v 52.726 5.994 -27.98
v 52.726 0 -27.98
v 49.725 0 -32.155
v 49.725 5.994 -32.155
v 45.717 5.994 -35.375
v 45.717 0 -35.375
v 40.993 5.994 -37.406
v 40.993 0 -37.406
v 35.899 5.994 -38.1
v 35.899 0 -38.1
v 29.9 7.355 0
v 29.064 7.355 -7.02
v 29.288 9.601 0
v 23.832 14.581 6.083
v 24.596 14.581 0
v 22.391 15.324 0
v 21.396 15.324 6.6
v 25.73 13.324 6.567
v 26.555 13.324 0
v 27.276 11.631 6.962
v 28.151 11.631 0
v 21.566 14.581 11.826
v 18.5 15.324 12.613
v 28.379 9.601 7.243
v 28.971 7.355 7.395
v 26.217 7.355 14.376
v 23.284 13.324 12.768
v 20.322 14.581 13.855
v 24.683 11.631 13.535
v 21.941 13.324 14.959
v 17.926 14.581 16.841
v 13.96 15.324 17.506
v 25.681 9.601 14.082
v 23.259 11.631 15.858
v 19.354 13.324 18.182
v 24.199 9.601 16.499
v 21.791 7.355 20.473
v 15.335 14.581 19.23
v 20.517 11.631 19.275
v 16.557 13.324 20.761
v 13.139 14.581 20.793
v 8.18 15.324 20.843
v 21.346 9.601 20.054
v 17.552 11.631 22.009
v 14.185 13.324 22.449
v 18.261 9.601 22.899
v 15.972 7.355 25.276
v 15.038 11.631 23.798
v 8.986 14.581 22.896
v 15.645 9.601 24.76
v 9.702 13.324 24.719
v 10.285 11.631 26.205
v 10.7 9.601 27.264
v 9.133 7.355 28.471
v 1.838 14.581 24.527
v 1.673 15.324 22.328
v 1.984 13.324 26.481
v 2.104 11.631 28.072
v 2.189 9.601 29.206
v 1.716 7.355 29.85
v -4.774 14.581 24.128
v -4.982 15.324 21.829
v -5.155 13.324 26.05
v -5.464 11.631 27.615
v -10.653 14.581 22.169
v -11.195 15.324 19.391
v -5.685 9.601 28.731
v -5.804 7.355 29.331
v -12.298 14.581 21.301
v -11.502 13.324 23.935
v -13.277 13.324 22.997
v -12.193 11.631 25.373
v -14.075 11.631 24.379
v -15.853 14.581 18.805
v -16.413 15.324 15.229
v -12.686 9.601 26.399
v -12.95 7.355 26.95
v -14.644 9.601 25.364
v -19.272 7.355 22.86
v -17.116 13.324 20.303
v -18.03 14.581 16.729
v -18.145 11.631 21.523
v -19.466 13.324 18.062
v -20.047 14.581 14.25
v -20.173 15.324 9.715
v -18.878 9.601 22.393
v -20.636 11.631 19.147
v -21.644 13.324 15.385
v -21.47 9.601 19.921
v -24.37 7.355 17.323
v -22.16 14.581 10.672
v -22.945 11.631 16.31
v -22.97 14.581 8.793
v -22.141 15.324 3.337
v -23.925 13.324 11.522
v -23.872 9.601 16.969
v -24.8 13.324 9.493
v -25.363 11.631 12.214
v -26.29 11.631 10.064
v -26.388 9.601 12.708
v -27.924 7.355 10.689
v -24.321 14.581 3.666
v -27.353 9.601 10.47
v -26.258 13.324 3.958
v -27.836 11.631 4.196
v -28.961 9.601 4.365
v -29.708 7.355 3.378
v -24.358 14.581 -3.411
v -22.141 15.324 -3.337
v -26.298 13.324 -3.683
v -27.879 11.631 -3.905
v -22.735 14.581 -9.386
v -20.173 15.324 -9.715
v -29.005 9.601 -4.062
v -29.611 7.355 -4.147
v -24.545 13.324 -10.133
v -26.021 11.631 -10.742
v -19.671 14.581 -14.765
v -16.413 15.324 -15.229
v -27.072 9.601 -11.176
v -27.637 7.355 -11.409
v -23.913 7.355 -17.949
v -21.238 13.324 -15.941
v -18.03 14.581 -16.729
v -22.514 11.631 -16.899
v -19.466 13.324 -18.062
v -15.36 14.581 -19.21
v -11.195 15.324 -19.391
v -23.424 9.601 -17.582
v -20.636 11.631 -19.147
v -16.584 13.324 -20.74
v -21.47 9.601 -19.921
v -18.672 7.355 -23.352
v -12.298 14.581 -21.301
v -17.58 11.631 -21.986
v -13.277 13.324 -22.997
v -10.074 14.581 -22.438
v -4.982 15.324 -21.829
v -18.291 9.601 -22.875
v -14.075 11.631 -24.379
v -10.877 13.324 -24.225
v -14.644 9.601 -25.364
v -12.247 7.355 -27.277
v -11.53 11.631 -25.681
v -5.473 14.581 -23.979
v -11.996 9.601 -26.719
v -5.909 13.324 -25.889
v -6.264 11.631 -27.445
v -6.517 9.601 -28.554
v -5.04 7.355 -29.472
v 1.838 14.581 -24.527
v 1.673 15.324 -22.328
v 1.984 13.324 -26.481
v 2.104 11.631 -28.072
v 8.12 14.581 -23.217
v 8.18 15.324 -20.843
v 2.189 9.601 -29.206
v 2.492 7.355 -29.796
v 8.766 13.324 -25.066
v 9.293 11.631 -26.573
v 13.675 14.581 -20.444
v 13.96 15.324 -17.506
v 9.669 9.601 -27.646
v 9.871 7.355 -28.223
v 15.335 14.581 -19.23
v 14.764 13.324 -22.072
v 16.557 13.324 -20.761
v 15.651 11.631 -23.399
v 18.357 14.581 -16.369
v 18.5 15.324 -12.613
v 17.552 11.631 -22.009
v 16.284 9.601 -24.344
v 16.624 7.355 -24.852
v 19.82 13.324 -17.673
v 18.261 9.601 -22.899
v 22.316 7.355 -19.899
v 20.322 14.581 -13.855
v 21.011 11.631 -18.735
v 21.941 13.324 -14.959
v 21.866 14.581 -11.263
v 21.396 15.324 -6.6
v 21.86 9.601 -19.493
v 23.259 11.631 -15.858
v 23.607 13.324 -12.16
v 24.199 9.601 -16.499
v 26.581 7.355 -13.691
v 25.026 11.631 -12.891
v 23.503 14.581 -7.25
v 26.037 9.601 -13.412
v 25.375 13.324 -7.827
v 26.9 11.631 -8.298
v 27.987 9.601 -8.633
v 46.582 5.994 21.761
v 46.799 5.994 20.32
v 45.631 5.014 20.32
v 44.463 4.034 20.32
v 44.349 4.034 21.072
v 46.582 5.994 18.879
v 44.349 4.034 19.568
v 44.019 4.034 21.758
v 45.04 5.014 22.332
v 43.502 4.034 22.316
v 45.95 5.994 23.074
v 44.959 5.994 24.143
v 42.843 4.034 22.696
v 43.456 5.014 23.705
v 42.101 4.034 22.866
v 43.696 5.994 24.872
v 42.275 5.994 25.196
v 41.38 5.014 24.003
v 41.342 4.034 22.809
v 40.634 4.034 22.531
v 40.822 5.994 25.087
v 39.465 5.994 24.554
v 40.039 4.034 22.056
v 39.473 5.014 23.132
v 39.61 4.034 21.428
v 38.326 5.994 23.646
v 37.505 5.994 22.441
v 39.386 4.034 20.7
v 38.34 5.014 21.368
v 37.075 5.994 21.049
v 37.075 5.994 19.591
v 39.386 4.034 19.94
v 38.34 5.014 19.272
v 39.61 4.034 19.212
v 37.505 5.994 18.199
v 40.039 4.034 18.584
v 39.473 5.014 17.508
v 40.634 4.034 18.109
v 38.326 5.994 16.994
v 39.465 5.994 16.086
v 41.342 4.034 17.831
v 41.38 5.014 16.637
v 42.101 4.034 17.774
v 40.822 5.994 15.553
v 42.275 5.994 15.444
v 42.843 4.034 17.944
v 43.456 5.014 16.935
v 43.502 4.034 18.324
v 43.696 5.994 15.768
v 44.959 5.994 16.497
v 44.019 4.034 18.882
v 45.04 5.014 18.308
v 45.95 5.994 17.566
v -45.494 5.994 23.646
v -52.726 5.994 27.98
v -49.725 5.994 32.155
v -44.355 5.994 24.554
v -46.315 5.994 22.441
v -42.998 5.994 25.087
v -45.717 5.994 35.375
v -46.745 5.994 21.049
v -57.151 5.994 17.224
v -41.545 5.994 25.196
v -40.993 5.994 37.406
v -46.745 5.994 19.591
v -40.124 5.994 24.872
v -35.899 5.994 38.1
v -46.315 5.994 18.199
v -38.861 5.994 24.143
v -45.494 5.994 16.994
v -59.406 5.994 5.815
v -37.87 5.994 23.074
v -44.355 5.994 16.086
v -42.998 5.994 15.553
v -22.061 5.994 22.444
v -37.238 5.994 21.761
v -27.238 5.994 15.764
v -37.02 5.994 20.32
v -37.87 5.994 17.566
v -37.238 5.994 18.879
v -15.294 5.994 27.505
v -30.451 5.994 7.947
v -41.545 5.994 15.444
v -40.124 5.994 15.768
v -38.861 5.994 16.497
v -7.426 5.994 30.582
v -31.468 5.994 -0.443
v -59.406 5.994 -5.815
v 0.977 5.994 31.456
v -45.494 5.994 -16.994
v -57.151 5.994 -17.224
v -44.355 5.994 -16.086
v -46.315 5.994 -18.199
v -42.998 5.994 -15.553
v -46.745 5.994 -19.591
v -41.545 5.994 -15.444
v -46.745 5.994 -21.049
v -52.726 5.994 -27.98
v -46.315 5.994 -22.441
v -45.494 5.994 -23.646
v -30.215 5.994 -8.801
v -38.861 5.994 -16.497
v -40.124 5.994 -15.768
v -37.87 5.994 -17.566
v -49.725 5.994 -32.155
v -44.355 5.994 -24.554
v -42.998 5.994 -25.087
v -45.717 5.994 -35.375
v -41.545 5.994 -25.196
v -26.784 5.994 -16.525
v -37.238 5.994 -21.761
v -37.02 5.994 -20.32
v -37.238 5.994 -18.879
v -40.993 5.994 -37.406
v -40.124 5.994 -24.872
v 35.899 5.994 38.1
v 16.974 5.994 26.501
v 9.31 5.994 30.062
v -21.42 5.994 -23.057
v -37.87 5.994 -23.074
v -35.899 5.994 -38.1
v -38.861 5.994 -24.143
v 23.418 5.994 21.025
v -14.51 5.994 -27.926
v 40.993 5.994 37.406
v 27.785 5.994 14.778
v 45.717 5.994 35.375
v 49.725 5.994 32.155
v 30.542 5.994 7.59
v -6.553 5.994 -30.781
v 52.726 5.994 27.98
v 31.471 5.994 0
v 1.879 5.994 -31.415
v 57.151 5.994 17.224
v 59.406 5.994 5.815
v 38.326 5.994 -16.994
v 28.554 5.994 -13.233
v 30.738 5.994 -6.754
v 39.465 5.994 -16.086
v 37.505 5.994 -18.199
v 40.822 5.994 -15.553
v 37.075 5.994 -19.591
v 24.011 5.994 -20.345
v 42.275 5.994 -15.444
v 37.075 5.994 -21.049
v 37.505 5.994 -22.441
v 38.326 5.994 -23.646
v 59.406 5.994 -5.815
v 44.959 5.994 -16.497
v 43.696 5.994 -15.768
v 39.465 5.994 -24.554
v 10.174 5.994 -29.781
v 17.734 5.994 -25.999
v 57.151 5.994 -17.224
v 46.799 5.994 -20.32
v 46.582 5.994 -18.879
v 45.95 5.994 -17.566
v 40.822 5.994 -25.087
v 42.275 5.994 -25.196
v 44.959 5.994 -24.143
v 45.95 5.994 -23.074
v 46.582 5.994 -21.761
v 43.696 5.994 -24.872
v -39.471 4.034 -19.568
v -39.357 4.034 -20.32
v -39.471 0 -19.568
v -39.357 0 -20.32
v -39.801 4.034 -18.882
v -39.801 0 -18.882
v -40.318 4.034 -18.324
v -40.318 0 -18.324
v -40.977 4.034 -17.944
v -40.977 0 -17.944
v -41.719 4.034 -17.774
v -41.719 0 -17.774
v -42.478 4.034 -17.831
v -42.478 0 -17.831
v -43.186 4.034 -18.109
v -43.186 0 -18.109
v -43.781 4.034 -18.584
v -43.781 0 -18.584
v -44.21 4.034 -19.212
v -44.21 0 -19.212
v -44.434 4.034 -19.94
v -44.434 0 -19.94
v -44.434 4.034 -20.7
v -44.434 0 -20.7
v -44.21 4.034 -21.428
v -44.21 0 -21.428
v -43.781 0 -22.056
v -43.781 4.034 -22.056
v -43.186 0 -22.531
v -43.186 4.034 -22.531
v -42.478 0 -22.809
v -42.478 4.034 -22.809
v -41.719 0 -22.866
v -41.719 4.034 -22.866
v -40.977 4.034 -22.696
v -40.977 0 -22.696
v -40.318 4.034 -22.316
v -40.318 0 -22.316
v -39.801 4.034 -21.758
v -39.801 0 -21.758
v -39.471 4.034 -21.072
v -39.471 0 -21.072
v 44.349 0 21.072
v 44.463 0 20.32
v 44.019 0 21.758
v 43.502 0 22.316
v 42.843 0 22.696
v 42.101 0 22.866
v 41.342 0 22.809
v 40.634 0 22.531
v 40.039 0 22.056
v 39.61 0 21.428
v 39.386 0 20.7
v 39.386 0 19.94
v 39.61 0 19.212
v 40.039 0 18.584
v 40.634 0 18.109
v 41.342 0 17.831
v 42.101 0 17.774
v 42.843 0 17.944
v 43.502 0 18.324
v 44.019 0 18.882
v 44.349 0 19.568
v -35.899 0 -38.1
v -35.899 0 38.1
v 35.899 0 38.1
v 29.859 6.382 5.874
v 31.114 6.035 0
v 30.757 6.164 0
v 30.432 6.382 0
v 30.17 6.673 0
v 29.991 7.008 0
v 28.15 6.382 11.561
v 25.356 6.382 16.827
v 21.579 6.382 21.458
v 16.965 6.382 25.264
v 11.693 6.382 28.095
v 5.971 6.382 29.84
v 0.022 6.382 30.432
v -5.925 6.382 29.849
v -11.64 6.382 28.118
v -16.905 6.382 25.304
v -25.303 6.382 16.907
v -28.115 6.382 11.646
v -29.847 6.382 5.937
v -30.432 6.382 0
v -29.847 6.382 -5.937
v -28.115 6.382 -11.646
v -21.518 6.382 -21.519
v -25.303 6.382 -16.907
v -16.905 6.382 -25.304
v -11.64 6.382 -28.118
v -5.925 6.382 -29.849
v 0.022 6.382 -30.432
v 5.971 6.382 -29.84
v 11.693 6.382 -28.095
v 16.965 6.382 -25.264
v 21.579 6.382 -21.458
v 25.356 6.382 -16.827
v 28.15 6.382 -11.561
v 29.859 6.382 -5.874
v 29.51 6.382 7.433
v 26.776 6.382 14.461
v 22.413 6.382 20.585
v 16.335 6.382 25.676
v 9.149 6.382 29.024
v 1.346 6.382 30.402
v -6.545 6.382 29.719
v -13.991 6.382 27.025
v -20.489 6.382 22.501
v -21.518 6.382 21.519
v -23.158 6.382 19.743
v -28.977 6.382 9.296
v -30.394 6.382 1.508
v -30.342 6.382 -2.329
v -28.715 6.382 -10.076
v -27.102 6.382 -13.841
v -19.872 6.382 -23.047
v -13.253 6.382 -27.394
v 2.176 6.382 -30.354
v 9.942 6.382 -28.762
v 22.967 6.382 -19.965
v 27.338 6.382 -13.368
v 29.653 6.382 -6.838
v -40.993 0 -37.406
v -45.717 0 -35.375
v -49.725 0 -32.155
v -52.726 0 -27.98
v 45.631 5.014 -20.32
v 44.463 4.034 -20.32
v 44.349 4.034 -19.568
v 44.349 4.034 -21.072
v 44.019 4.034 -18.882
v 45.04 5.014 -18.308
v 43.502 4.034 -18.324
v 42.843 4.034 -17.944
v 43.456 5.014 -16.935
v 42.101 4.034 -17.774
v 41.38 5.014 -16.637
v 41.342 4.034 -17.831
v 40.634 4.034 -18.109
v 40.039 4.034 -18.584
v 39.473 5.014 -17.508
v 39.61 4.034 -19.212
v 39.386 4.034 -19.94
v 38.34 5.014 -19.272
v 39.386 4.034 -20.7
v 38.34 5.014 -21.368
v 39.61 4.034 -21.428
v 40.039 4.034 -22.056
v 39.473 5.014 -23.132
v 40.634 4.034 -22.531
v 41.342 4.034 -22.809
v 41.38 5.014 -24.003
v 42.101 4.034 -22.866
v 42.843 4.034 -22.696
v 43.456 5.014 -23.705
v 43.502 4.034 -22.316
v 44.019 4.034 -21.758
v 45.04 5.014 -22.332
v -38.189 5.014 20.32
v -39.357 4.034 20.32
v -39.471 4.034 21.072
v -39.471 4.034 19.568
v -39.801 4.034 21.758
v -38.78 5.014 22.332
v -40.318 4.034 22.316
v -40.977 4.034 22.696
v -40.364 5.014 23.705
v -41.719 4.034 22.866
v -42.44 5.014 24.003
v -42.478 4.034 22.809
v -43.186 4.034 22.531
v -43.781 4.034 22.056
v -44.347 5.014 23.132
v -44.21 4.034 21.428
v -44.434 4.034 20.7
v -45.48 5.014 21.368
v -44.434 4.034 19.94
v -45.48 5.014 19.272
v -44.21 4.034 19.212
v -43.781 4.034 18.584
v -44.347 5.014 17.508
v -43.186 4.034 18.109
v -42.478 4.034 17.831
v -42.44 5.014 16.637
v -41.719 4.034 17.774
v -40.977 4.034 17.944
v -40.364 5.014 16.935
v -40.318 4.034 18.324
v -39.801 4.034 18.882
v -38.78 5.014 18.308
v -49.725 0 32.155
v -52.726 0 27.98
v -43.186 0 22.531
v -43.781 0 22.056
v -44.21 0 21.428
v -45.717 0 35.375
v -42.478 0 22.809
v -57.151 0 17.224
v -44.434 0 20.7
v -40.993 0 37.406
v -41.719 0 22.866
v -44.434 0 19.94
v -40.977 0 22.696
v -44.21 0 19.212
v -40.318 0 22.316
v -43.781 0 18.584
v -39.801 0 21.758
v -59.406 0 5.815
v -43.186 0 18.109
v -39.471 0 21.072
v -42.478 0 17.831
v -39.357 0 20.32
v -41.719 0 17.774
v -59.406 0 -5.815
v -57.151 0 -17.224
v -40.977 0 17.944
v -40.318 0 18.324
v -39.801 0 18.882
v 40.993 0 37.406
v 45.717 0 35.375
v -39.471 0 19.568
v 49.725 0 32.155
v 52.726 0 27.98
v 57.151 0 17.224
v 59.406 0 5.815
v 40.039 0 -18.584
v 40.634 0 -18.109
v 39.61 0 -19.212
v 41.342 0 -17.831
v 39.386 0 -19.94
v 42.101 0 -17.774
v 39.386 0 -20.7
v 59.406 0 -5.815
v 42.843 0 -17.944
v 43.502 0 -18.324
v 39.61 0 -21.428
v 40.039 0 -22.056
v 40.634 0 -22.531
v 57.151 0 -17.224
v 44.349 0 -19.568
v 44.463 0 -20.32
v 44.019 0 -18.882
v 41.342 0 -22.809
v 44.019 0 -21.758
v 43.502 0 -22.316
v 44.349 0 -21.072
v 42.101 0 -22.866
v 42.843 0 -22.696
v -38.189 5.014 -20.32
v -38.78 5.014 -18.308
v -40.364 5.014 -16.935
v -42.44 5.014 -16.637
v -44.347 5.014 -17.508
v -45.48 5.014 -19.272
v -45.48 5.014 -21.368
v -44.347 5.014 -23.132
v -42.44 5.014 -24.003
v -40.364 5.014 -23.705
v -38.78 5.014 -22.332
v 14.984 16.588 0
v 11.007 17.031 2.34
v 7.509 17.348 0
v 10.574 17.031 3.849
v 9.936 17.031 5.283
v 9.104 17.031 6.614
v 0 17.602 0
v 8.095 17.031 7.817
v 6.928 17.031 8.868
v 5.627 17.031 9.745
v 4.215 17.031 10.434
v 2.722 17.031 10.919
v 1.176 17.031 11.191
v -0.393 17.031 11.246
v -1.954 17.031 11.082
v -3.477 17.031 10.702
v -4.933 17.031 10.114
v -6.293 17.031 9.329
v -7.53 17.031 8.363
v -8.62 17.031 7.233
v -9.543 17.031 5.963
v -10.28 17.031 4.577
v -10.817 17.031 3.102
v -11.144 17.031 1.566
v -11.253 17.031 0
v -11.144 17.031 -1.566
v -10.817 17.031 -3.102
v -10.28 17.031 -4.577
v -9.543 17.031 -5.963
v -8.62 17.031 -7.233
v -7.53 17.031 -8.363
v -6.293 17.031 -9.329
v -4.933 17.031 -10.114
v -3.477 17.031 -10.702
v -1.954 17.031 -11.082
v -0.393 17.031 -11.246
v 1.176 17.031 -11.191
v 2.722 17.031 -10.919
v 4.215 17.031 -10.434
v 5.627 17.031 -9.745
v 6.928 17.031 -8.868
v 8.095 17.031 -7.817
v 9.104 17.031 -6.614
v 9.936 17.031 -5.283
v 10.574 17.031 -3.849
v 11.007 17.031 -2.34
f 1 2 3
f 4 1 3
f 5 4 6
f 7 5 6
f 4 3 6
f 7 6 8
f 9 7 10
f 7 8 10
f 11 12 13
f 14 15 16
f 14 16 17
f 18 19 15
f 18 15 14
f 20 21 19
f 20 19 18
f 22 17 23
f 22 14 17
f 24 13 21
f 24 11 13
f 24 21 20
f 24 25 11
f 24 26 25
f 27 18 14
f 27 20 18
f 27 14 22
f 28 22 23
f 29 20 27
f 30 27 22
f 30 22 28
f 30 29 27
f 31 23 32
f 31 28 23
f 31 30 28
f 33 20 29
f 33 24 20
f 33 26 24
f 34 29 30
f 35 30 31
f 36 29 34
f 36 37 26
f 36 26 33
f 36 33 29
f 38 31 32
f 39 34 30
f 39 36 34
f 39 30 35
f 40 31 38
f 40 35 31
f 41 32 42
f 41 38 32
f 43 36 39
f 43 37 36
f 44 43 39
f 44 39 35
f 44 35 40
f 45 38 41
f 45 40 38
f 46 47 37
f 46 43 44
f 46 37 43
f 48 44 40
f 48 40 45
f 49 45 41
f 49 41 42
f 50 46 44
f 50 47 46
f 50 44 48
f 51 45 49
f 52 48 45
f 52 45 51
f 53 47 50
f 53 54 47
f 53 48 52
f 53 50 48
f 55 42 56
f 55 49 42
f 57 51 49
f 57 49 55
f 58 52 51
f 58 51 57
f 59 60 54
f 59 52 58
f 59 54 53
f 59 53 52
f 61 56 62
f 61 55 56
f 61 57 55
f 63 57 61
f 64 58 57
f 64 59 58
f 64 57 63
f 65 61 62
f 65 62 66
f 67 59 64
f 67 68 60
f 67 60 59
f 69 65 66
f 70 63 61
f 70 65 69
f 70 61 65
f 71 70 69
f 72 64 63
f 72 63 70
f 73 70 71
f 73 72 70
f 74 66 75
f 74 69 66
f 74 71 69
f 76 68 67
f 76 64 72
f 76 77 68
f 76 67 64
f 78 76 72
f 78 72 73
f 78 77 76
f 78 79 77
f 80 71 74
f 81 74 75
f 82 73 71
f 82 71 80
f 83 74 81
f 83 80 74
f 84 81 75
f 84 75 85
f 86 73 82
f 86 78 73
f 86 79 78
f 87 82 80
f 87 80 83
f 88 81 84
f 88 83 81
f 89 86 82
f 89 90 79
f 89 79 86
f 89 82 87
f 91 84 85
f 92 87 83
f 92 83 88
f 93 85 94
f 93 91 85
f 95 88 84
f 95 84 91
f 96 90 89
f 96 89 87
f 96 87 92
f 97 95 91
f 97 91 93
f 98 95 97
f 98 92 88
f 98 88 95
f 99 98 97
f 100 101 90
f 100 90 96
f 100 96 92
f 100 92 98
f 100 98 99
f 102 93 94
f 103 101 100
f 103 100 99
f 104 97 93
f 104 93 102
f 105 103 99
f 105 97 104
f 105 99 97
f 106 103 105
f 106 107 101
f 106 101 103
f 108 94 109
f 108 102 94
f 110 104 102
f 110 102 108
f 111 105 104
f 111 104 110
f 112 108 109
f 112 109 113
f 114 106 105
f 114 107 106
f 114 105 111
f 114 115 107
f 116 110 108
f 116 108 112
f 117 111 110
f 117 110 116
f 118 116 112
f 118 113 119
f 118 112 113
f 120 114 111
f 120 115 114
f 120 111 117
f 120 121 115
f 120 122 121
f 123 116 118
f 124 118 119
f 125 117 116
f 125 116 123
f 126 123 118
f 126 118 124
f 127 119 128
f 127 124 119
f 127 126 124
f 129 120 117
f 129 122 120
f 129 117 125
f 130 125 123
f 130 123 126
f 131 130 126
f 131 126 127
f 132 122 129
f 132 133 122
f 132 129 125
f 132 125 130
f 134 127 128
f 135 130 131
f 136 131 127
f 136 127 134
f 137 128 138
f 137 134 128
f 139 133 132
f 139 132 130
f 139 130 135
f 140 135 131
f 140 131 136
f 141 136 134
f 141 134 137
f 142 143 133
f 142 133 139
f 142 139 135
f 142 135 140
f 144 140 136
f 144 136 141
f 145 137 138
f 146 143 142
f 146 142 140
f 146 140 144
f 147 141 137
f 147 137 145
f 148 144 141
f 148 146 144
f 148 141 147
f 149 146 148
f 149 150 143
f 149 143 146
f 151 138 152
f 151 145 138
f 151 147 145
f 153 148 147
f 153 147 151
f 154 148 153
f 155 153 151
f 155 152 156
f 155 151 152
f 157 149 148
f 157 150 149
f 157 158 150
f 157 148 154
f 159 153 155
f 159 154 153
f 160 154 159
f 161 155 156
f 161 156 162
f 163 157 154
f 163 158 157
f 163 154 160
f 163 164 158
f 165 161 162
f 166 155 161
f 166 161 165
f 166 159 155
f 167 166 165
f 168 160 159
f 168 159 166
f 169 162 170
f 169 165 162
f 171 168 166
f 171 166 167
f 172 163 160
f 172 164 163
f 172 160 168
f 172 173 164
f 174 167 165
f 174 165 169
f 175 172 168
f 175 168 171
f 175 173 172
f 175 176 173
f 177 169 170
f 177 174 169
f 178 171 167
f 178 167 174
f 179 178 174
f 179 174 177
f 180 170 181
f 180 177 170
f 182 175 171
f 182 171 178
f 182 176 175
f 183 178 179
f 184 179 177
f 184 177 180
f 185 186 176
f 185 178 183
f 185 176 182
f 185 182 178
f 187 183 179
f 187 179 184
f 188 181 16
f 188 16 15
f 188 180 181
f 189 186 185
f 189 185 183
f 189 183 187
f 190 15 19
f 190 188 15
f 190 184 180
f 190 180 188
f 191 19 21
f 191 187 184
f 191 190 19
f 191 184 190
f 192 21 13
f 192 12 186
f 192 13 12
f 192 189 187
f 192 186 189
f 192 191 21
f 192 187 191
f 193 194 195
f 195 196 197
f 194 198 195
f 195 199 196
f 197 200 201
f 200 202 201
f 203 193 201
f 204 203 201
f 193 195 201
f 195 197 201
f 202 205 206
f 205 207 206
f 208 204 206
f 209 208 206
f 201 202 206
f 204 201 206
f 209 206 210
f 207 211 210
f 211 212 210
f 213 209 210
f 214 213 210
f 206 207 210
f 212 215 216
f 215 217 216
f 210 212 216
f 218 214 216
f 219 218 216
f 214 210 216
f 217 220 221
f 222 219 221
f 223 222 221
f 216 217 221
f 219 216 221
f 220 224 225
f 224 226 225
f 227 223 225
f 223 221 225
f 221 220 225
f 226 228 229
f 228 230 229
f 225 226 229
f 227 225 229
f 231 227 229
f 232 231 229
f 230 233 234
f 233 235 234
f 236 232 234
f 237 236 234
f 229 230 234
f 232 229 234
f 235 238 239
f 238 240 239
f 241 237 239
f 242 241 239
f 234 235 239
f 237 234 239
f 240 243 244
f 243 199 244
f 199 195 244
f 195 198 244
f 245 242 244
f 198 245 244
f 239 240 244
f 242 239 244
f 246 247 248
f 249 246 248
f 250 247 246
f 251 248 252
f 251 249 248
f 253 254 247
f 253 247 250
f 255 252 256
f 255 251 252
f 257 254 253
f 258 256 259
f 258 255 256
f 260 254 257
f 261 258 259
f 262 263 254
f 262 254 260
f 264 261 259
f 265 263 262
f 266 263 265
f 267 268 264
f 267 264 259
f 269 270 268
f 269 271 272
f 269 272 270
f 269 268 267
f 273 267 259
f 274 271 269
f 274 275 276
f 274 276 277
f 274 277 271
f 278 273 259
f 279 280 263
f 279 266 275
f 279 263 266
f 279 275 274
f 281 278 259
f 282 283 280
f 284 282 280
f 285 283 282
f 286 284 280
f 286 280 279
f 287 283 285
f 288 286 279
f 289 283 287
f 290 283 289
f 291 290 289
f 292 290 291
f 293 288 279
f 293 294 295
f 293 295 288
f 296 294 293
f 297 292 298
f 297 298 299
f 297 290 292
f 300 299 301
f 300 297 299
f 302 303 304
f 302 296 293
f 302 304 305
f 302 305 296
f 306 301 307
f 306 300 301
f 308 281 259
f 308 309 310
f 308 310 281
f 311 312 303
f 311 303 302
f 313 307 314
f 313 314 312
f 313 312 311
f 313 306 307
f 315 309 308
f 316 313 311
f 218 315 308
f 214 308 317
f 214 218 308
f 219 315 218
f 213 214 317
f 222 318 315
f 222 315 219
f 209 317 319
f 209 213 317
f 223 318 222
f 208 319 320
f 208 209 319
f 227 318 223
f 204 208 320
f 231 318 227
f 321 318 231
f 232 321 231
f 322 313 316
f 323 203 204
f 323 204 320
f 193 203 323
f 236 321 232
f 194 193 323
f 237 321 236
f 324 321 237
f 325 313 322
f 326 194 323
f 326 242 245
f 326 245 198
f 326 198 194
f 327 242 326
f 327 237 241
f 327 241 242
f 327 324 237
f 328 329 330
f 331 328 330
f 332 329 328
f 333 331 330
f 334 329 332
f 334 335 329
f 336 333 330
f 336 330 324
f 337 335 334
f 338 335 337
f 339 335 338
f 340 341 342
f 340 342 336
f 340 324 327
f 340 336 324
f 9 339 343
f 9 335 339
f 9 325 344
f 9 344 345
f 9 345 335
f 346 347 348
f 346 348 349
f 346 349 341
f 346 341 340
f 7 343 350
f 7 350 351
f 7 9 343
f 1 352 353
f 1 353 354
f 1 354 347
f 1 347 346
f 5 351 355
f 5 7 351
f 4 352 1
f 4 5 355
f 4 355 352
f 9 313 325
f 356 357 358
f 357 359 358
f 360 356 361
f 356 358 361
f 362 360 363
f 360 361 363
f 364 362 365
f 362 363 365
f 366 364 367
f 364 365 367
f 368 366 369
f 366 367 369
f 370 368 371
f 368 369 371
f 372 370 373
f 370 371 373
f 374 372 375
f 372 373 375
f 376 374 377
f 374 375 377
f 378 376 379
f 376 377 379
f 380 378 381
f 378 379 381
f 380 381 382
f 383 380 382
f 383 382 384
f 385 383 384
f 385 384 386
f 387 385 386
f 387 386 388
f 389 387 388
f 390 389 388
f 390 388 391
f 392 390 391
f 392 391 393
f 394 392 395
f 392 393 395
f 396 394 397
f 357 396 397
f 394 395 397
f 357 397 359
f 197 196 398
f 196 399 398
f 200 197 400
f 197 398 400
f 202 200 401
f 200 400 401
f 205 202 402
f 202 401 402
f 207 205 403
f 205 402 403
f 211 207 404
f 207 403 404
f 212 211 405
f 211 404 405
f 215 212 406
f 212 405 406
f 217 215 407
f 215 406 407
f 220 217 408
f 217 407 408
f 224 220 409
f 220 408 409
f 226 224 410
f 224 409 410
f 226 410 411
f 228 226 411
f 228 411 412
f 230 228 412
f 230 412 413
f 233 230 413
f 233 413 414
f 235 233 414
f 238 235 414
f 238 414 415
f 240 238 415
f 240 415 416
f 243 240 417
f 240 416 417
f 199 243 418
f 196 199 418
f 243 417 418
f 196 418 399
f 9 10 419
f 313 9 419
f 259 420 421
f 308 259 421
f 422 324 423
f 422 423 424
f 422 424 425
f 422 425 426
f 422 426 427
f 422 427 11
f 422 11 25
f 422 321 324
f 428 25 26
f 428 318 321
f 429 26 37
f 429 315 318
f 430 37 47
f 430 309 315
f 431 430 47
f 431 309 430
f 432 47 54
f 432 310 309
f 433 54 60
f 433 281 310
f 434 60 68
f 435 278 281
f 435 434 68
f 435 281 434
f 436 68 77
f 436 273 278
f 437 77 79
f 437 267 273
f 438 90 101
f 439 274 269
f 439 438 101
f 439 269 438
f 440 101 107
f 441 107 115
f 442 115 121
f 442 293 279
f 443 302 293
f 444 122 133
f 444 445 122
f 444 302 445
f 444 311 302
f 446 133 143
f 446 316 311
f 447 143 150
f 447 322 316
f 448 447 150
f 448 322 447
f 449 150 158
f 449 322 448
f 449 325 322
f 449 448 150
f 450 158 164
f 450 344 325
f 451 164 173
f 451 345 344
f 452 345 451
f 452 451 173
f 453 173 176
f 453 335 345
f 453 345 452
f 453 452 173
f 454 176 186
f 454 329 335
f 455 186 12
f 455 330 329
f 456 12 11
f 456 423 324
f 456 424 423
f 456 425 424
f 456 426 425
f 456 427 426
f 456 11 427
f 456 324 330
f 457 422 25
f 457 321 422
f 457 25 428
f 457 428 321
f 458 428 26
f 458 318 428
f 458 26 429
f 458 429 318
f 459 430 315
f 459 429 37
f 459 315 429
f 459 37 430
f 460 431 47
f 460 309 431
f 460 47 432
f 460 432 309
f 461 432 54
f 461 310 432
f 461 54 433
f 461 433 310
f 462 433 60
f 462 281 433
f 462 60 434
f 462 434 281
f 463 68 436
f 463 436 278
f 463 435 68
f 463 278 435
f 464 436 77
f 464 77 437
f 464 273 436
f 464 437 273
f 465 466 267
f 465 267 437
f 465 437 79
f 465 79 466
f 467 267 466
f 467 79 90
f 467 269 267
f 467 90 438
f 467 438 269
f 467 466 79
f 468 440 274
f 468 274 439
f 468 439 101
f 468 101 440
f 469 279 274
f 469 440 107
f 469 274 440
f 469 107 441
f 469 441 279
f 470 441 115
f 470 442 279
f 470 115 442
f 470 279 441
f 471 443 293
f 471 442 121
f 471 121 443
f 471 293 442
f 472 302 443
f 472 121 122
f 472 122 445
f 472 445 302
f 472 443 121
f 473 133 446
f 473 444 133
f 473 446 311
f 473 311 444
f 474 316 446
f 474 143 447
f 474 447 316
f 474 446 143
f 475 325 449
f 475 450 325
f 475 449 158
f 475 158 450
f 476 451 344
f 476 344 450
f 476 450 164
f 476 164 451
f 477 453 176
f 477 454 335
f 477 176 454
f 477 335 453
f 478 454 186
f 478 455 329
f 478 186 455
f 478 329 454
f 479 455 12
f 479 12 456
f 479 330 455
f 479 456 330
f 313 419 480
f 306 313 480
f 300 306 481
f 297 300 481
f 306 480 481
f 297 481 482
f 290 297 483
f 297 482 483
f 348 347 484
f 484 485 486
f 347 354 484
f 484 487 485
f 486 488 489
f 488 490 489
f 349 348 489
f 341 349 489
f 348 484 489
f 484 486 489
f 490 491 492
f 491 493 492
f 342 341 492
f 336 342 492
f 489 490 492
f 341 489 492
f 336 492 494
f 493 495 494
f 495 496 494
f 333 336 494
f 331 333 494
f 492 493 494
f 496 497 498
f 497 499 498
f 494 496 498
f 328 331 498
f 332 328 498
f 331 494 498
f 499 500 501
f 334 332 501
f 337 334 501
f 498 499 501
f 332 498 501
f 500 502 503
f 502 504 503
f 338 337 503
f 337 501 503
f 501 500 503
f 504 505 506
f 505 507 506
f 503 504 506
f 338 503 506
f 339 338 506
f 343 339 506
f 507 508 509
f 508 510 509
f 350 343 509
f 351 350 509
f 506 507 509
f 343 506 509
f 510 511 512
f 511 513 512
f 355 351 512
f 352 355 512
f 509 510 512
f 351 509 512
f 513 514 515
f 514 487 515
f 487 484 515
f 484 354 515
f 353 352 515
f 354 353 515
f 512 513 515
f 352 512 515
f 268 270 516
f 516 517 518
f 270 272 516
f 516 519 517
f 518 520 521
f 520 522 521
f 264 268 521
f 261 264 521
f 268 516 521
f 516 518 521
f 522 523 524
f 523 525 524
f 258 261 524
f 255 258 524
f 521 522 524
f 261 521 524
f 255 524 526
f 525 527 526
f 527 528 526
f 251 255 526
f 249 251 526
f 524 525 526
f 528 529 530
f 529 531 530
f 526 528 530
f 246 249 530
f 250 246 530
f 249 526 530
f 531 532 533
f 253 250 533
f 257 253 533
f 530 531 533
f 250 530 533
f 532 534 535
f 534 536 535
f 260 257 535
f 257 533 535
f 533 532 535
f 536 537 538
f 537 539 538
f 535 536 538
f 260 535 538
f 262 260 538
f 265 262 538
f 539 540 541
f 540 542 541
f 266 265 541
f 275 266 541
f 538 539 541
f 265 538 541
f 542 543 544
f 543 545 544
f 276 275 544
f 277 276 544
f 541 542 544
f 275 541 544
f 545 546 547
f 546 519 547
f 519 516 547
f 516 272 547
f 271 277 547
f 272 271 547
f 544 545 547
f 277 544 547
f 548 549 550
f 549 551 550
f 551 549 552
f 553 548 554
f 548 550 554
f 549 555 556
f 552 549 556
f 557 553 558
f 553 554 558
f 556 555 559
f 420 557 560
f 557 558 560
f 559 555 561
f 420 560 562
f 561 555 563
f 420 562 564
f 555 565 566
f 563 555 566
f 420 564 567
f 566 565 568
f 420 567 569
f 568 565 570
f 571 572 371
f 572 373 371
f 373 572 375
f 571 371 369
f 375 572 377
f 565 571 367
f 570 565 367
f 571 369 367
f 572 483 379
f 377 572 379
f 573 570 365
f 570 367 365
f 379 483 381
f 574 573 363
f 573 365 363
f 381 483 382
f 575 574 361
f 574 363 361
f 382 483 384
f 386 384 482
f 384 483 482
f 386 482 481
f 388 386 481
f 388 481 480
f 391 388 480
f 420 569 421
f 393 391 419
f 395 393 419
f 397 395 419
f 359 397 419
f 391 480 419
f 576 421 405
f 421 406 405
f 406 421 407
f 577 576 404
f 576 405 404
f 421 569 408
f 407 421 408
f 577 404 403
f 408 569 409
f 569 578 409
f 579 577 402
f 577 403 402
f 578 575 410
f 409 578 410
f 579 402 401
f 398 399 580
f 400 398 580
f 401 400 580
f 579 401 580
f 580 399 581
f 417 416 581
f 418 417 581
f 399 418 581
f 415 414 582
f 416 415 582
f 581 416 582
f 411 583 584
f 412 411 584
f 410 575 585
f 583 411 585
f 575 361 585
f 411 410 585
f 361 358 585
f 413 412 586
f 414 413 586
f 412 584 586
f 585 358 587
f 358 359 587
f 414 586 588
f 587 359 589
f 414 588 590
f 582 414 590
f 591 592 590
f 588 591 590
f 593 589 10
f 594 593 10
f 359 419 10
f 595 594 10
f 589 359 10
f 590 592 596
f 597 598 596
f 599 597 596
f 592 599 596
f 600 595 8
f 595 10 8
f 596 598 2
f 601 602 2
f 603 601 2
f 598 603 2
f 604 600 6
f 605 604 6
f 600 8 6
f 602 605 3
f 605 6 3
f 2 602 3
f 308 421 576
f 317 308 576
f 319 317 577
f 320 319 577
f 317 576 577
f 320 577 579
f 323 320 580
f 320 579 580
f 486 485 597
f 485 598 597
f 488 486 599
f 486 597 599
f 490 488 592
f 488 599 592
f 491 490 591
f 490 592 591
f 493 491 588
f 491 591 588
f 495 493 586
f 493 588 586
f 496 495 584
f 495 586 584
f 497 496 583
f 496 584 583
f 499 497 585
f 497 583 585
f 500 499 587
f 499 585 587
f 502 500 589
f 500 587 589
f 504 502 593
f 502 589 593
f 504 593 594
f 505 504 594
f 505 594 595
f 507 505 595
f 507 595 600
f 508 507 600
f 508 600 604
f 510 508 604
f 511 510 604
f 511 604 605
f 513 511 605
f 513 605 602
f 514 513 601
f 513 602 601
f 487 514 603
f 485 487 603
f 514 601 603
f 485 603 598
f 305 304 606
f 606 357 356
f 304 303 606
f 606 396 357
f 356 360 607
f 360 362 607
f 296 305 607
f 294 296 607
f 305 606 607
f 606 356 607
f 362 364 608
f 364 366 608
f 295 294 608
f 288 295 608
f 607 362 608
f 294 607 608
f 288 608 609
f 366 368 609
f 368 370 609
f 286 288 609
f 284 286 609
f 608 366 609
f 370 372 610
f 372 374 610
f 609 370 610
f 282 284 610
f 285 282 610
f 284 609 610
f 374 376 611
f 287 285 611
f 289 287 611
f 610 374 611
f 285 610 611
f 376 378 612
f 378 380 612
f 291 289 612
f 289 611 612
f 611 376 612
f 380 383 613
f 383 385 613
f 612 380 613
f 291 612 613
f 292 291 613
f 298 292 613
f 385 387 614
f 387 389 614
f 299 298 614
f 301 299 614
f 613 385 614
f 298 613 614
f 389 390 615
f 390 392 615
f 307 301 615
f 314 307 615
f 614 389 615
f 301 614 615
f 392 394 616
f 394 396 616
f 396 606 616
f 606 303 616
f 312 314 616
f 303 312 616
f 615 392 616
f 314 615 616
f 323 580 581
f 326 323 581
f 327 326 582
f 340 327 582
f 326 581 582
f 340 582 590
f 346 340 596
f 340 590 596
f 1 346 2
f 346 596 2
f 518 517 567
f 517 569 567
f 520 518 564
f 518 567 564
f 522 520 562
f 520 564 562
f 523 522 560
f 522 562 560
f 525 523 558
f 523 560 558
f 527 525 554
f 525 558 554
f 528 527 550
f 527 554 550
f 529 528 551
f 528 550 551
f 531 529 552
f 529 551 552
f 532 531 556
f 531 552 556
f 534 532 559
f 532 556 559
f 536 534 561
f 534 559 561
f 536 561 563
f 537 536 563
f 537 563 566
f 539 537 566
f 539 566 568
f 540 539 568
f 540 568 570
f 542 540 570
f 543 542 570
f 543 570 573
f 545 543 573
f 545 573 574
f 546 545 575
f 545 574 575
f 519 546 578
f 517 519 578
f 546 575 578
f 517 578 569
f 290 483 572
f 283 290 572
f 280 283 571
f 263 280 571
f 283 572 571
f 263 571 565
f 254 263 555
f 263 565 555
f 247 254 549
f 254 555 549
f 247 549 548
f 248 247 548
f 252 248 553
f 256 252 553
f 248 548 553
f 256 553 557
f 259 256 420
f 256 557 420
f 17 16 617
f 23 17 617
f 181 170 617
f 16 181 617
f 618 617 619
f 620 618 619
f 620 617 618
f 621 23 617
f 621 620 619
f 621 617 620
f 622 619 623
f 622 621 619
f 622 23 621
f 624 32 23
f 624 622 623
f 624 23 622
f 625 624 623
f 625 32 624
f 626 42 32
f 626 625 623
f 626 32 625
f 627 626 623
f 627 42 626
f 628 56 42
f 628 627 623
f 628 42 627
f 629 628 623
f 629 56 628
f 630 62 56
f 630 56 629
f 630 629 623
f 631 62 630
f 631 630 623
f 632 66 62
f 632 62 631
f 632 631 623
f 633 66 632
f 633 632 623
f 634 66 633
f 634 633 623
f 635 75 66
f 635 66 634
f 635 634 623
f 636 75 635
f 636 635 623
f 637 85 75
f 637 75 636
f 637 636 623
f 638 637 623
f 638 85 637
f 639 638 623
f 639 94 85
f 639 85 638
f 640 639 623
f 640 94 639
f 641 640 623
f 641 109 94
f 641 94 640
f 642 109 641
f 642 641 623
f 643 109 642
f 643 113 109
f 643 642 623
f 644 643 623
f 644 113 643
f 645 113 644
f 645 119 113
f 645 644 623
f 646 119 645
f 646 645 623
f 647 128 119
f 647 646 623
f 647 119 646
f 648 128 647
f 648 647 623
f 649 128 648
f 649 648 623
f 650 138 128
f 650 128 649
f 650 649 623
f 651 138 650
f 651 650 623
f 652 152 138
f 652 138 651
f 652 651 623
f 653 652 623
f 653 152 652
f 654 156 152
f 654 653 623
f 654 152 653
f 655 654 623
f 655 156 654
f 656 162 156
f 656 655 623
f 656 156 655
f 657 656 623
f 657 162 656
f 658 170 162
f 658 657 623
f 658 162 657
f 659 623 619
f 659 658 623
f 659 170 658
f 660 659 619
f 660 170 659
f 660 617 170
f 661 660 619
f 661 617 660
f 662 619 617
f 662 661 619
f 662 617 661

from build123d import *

# Parameters (mm, degrees)
BOSS_EXTRUDE1_DEPTH                                = 5.9944
FILLET1_R                                          = 1.5875
CSK_FOR_10_FLAT_HEAD_MACHINE_SCREW_100_D           = 5.1054
CSK_FOR_10_FLAT_HEAD_MACHINE_SCREW_100_CSINK_D     = 9.779
CSK_FOR_10_FLAT_HEAD_MACHINE_SCREW_100_CSINK_ANGLE = 100


with BuildPart() as part:
    # Sketch1 → Boss-Extrude1 (new body)
    with BuildSketch(Plane(origin=(0, 0, 0), x_dir=(1, 0, 0), z_dir=(0, 1, 0))):
        with BuildLine():
            Line((-35.898566824, -38.1), (35.898566824, -38.1))
            ThreePointArc((35.898566824, -38.1), (45.716712095, -35.375027517), (52.726020022, -27.9796875))
            ThreePointArc((52.726020022, -27.9796875), (59.69, 0), (52.726020022, 27.9796875))
            ThreePointArc((52.726020022, 27.9796875), (45.716712095, 35.375027517), (35.898566824, 38.1))
            Line((35.898566824, 38.1), (-35.898566824, 38.1))
            ThreePointArc((-35.898566824, 38.1), (-45.716712095, 35.375027517), (-52.726020022, 27.9796875))
            ThreePointArc((-52.726020022, 27.9796875), (-59.69, 0), (-52.726020022, -27.9796875))
            ThreePointArc((-52.726020022, -27.9796875), (-45.716712095, -35.375027517), (-35.898566824, -38.1))
        make_face()
    extrude(amount=BOSS_EXTRUDE1_DEPTH)

    # Sketch3 → Revolve1 (revolve)
    with BuildSketch(Plane.XY, mode=Mode.PRIVATE) as revolve1_sk:
        with BuildLine():
            Line((-29.9974, 5.9944), (0, 5.9944))
            Line((0, 5.9944), (0, 17.6022))
            ThreePointArc((0, 17.6022), (-11.253106327, 17.031245116), (-22.39063481, 15.324244597))
            ThreePointArc((-22.39063481, 15.324244597), (-27.854703555, 12.013305151), (-29.9974, 5.9944))
        make_face()
    revolve(revolve1_sk.sketch.rotate(Axis((0, 17.6022, 0), (0, -1, 0)), 180), axis=Axis((0, 17.6022, 0), (0, -1, 0)))

    # Fillet1
    fillet1_edges = [part.edges().sort_by_distance(p)[0] for p in [
        (-29.9974, 5.9944, 0),
    ]]
    fillet(fillet1_edges, radius=FILLET1_R)

    # CSK for #10 Flat Head Machine Screw (100)1 (through all)
    with Locations(Plane(origin=(0, 5.9944, 0), x_dir=(-1, 0, 0), z_dir=(0, 1, 0))):
        with Locations((41.91, -20.32), (41.91, 20.32), (-41.91, -20.32), (-41.91, 20.32)):
            CounterSinkHole(CSK_FOR_10_FLAT_HEAD_MACHINE_SCREW_100_D / 2, CSK_FOR_10_FLAT_HEAD_MACHINE_SCREW_100_CSINK_D / 2, counter_sink_angle=CSK_FOR_10_FLAT_HEAD_MACHINE_SCREW_100_CSINK_ANGLE)


solid = part.part
